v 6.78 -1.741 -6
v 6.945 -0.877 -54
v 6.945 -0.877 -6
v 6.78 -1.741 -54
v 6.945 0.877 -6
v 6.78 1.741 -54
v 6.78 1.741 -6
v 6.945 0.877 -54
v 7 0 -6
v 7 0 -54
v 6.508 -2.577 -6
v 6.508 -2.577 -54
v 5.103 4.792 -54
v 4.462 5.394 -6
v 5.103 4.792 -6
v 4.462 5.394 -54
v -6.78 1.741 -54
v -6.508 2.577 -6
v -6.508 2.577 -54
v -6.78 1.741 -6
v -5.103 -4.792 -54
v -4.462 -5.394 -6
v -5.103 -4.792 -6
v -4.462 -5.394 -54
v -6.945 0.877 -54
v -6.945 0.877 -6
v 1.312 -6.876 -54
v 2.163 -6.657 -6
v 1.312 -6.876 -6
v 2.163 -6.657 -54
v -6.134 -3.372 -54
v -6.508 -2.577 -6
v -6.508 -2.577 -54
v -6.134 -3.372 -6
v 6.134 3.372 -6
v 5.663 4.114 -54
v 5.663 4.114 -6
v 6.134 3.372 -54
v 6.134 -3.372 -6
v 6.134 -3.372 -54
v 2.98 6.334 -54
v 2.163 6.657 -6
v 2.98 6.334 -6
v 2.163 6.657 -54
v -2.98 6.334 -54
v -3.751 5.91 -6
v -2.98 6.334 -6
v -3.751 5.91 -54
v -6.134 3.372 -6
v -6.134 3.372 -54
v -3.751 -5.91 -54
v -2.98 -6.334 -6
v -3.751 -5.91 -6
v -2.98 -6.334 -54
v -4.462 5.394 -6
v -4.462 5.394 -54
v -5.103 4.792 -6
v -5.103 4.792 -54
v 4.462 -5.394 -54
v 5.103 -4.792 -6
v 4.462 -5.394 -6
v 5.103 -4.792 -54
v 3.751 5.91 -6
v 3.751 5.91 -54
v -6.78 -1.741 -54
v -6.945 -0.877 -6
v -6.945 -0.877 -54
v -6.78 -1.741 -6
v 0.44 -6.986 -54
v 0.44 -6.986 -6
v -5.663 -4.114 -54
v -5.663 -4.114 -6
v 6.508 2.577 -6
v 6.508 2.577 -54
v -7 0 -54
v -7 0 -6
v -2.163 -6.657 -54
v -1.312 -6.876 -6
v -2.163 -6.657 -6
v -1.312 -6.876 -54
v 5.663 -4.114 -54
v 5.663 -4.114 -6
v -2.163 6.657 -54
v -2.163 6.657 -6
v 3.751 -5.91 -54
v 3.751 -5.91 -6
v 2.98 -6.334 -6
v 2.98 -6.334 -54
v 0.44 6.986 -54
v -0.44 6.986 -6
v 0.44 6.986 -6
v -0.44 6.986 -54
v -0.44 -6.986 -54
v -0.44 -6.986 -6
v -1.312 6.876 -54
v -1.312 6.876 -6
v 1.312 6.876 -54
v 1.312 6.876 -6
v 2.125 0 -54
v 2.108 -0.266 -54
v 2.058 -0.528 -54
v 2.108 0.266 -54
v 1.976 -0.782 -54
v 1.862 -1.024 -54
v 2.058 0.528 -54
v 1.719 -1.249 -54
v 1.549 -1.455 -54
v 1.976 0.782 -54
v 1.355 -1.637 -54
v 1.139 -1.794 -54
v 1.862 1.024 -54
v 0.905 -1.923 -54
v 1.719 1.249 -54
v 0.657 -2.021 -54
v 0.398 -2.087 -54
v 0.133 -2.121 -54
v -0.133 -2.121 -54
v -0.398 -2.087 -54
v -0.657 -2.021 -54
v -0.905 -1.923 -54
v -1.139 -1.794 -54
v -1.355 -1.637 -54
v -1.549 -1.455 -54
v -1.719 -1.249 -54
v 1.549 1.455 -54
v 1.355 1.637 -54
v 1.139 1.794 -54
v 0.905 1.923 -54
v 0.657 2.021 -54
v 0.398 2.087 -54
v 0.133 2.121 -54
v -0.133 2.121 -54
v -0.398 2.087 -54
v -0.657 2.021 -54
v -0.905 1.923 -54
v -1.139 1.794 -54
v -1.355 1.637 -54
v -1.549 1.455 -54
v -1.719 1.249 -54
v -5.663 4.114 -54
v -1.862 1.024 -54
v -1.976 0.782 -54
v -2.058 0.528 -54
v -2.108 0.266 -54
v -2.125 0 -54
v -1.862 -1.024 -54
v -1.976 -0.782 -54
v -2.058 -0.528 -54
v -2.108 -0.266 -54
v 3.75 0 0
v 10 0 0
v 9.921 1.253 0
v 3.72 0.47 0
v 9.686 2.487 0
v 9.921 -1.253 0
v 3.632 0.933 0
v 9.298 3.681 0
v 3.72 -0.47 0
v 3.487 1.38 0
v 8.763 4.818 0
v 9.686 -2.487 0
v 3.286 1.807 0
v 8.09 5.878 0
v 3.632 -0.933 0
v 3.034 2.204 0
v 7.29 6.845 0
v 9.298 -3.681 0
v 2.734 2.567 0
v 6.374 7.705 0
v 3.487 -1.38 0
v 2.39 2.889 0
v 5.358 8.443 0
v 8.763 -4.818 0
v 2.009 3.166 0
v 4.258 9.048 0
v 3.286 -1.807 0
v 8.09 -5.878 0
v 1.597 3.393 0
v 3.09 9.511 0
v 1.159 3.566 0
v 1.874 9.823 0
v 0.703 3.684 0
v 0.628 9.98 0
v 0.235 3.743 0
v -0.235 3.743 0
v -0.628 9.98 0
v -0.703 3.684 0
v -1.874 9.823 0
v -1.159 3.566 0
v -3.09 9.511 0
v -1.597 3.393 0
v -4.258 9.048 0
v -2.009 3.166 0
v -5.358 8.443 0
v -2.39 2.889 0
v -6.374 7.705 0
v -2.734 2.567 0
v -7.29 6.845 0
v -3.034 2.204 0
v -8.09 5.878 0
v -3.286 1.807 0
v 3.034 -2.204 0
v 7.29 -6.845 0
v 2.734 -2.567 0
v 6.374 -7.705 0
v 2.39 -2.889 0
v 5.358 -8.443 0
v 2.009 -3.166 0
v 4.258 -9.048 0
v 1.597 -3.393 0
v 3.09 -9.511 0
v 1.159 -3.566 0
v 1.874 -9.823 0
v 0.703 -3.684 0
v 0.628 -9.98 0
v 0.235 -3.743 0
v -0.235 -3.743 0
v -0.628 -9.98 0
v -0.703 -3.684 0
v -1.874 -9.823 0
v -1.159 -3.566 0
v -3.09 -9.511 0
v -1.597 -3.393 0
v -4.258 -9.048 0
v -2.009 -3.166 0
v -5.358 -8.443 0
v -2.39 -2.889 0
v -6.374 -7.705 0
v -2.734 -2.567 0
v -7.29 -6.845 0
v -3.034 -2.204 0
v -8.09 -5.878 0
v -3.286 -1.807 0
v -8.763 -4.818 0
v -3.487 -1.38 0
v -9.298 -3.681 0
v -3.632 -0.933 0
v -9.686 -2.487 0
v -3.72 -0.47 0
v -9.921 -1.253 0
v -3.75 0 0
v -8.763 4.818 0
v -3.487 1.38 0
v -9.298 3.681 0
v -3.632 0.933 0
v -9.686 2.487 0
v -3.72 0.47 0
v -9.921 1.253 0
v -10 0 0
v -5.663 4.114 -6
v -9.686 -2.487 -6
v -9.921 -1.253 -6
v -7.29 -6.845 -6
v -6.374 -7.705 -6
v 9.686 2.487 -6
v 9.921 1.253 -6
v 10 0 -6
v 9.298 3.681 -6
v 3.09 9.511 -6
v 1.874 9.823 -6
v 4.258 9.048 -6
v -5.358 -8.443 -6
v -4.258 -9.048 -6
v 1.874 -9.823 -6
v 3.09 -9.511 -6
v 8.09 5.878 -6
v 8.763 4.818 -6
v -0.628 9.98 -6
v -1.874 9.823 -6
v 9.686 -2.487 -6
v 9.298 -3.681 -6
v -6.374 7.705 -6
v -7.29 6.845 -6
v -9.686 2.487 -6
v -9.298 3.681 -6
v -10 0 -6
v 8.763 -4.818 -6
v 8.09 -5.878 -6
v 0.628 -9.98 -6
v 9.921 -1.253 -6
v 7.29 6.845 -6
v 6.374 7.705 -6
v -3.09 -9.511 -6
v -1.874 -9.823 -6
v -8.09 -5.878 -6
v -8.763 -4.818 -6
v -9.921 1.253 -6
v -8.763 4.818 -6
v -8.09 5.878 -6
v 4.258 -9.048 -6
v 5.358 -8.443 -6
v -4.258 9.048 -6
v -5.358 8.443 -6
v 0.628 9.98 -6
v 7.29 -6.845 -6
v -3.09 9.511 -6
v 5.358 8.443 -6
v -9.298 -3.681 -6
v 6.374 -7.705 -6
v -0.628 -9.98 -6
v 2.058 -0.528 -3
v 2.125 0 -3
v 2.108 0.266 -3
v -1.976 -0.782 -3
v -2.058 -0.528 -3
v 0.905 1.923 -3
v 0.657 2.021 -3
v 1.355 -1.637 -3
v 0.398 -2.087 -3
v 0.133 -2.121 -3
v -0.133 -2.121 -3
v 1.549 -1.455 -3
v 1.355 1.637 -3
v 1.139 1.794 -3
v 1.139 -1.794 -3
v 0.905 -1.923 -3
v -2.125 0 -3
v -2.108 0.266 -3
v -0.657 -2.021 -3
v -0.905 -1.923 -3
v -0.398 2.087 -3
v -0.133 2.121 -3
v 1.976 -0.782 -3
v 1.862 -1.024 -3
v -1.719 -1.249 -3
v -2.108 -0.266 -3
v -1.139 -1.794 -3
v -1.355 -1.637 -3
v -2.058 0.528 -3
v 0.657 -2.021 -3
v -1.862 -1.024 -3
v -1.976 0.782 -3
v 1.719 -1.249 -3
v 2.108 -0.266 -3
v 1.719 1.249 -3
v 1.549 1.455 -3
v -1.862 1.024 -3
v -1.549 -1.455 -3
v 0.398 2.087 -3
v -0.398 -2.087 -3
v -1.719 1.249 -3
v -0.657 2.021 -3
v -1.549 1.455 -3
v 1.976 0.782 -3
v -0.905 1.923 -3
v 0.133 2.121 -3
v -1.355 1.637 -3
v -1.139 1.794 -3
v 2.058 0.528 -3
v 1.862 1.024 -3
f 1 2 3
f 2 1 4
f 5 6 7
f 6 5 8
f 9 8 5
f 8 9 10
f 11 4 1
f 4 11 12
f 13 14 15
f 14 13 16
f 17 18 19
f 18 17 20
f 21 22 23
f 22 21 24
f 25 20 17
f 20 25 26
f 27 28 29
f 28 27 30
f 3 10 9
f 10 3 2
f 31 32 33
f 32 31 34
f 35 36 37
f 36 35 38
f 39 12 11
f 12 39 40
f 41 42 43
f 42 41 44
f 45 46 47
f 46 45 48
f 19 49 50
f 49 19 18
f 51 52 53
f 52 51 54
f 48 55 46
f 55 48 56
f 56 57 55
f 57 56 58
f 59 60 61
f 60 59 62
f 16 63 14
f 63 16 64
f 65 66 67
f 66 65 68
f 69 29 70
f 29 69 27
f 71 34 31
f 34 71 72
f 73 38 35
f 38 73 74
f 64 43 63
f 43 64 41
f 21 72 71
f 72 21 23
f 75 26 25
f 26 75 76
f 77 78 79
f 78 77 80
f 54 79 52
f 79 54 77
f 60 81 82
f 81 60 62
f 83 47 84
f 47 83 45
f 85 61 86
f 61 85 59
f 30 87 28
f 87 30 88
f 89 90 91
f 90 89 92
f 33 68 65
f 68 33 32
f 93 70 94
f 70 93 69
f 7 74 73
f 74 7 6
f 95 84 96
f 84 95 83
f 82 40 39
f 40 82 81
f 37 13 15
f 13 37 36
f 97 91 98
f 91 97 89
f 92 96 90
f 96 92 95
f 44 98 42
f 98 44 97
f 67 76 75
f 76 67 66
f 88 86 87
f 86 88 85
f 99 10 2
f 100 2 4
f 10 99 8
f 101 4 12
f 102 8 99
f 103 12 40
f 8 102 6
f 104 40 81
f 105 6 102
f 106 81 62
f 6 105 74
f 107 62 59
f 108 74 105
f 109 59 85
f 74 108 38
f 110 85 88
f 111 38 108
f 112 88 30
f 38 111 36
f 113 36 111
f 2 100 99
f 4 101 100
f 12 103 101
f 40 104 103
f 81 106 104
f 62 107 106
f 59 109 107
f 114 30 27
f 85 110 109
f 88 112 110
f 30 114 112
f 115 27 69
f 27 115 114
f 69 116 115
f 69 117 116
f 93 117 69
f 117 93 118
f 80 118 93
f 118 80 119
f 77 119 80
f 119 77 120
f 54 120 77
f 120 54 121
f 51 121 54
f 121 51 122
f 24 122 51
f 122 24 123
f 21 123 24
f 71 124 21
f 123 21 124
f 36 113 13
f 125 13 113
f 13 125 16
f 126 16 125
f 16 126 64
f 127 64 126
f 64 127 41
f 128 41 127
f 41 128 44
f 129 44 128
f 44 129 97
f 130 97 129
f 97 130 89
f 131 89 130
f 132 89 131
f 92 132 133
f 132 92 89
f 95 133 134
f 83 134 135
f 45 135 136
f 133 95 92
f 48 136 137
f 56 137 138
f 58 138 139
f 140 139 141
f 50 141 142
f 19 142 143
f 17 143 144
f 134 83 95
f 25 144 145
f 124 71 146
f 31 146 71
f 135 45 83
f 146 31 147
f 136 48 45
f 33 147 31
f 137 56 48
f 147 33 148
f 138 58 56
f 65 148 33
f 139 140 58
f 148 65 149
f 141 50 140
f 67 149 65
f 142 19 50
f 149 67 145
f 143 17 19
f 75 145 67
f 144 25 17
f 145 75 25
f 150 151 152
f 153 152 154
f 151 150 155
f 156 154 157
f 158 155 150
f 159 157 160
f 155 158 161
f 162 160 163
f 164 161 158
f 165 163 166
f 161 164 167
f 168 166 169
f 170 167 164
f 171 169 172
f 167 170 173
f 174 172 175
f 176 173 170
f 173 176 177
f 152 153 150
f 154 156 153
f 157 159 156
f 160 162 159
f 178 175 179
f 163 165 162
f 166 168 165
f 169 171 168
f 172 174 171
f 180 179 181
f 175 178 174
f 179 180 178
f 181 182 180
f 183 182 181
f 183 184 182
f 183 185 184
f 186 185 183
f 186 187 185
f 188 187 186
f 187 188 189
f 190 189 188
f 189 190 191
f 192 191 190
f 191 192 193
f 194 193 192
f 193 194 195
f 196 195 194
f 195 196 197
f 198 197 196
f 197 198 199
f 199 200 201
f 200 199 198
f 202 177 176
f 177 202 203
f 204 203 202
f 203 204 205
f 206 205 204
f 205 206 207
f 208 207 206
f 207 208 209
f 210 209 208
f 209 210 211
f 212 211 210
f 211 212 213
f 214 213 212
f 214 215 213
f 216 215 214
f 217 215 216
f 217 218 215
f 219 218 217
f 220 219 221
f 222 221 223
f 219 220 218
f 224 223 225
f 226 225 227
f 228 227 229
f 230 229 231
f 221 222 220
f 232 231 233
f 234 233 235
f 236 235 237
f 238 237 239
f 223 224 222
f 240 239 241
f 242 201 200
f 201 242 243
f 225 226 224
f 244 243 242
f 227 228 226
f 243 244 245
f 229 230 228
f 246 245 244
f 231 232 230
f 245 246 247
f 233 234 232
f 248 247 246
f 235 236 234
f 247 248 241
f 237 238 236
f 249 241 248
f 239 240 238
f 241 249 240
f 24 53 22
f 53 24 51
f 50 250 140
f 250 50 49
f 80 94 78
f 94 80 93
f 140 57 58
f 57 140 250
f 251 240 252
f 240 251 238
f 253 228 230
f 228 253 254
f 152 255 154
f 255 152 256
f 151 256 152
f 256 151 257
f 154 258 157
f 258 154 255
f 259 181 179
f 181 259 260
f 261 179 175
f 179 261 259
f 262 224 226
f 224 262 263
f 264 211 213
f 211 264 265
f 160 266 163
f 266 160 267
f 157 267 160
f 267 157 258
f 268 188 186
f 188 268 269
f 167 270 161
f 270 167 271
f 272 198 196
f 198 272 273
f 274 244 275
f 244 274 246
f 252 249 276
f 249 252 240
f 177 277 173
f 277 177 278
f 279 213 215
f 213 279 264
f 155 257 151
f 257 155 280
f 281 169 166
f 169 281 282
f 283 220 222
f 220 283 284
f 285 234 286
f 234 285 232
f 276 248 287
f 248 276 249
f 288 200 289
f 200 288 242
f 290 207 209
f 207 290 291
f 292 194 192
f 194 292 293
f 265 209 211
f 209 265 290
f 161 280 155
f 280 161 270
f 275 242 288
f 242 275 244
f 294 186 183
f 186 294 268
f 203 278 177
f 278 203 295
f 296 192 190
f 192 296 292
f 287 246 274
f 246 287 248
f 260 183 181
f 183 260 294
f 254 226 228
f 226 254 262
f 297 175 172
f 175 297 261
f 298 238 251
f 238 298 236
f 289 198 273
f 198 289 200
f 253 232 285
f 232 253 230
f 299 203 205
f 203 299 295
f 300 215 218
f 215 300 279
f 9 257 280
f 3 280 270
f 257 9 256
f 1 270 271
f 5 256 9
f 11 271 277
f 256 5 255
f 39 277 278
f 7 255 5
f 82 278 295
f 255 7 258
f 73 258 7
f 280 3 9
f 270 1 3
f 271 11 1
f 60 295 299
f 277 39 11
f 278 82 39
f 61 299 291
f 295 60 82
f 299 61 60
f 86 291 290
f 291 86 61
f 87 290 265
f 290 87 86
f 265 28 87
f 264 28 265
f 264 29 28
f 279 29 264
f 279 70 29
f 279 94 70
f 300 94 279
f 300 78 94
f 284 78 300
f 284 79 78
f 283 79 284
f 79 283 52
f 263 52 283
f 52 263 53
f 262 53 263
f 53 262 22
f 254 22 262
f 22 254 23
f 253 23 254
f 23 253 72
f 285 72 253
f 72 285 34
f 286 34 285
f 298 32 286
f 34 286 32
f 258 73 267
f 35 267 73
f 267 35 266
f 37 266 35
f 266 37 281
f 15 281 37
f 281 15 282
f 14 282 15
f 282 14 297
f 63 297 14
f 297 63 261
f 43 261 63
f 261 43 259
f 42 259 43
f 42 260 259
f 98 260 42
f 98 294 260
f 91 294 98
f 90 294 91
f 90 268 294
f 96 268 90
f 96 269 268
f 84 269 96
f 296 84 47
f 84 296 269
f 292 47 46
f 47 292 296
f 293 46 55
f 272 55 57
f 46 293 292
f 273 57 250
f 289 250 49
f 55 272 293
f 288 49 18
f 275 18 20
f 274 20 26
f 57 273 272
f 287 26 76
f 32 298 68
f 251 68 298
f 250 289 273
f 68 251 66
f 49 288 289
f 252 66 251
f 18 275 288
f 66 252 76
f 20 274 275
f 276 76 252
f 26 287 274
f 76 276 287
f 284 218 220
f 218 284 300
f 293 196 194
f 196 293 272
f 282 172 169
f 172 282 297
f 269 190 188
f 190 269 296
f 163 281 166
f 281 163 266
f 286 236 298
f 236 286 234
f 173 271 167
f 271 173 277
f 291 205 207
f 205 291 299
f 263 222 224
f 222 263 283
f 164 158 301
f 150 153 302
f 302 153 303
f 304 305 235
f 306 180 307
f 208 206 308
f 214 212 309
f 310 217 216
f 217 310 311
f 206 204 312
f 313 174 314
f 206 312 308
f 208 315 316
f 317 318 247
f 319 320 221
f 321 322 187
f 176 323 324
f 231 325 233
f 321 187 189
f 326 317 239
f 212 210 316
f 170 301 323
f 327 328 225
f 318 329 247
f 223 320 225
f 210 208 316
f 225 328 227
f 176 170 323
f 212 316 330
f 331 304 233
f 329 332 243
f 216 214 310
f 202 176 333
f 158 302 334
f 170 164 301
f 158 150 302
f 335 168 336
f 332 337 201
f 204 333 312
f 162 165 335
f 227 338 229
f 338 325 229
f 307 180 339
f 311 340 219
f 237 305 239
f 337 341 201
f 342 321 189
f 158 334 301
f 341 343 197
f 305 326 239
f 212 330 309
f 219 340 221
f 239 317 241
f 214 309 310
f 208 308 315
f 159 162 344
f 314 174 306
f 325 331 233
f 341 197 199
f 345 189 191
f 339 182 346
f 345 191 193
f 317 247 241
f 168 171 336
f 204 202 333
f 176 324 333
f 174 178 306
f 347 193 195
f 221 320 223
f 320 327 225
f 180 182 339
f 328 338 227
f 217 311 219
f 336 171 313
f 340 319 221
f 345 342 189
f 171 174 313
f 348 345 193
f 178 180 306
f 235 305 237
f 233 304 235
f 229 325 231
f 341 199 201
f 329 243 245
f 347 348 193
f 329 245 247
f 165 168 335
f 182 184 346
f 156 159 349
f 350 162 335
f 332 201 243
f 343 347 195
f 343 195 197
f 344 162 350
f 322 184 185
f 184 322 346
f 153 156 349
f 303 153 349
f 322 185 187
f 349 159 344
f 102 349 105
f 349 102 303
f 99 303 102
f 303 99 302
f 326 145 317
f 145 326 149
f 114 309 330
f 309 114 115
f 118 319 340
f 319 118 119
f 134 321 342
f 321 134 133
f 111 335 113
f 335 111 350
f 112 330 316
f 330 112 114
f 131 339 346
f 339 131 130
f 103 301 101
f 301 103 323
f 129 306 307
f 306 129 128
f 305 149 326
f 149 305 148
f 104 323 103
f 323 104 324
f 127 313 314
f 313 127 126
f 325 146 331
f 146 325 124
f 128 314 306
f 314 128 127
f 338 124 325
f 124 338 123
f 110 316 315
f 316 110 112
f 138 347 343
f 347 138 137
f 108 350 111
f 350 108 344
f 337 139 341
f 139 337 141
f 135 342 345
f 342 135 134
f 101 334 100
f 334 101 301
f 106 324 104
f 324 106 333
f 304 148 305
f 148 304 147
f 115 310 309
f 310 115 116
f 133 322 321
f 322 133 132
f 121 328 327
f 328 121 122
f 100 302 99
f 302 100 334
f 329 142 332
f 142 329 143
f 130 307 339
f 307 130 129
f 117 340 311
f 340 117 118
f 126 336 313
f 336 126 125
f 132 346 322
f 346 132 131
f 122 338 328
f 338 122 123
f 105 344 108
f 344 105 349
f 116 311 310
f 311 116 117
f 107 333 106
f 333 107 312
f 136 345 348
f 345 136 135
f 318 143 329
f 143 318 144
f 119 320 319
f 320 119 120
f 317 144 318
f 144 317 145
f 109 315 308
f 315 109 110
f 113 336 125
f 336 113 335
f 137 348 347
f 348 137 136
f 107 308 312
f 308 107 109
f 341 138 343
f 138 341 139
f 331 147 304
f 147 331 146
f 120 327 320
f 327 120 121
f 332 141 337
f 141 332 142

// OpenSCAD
$fn = 50;


difference() {
	union() {
		translate(v = [0, 0, -54.0000000000]) {
			cylinder(h = 54, r = 7.0000000000);
		}
		translate(v = [0, 0, -6.0000000000]) {
			cylinder(h = 6, r = 10.0000000000);
		}
	}
	union() {
		translate(v = [0, 0, 0]) {
			rotate(a = [0, 0, 0]) {
				difference() {
					union() {
						#translate(v = [0, 0, -54.0000000000]) {
							cylinder(h = 54, r = 2.0000000000);
						}
						#translate(v = [0, 0, -3]) {
							cylinder(h = 3, r = 7.0000000000, r1 = 2.1250000000, r2 = 3.7500000000);
						}
						#translate(v = [0, 0, -54.0000000000]) {
							cylinder(h = 54, r = 2.1250000000);
						}
						#translate(v = [0, 0, -54.0000000000]) {
							cylinder(h = 54, r = 2.0000000000);
						}
					}
					union();
				}
			}
		}
	}
}
